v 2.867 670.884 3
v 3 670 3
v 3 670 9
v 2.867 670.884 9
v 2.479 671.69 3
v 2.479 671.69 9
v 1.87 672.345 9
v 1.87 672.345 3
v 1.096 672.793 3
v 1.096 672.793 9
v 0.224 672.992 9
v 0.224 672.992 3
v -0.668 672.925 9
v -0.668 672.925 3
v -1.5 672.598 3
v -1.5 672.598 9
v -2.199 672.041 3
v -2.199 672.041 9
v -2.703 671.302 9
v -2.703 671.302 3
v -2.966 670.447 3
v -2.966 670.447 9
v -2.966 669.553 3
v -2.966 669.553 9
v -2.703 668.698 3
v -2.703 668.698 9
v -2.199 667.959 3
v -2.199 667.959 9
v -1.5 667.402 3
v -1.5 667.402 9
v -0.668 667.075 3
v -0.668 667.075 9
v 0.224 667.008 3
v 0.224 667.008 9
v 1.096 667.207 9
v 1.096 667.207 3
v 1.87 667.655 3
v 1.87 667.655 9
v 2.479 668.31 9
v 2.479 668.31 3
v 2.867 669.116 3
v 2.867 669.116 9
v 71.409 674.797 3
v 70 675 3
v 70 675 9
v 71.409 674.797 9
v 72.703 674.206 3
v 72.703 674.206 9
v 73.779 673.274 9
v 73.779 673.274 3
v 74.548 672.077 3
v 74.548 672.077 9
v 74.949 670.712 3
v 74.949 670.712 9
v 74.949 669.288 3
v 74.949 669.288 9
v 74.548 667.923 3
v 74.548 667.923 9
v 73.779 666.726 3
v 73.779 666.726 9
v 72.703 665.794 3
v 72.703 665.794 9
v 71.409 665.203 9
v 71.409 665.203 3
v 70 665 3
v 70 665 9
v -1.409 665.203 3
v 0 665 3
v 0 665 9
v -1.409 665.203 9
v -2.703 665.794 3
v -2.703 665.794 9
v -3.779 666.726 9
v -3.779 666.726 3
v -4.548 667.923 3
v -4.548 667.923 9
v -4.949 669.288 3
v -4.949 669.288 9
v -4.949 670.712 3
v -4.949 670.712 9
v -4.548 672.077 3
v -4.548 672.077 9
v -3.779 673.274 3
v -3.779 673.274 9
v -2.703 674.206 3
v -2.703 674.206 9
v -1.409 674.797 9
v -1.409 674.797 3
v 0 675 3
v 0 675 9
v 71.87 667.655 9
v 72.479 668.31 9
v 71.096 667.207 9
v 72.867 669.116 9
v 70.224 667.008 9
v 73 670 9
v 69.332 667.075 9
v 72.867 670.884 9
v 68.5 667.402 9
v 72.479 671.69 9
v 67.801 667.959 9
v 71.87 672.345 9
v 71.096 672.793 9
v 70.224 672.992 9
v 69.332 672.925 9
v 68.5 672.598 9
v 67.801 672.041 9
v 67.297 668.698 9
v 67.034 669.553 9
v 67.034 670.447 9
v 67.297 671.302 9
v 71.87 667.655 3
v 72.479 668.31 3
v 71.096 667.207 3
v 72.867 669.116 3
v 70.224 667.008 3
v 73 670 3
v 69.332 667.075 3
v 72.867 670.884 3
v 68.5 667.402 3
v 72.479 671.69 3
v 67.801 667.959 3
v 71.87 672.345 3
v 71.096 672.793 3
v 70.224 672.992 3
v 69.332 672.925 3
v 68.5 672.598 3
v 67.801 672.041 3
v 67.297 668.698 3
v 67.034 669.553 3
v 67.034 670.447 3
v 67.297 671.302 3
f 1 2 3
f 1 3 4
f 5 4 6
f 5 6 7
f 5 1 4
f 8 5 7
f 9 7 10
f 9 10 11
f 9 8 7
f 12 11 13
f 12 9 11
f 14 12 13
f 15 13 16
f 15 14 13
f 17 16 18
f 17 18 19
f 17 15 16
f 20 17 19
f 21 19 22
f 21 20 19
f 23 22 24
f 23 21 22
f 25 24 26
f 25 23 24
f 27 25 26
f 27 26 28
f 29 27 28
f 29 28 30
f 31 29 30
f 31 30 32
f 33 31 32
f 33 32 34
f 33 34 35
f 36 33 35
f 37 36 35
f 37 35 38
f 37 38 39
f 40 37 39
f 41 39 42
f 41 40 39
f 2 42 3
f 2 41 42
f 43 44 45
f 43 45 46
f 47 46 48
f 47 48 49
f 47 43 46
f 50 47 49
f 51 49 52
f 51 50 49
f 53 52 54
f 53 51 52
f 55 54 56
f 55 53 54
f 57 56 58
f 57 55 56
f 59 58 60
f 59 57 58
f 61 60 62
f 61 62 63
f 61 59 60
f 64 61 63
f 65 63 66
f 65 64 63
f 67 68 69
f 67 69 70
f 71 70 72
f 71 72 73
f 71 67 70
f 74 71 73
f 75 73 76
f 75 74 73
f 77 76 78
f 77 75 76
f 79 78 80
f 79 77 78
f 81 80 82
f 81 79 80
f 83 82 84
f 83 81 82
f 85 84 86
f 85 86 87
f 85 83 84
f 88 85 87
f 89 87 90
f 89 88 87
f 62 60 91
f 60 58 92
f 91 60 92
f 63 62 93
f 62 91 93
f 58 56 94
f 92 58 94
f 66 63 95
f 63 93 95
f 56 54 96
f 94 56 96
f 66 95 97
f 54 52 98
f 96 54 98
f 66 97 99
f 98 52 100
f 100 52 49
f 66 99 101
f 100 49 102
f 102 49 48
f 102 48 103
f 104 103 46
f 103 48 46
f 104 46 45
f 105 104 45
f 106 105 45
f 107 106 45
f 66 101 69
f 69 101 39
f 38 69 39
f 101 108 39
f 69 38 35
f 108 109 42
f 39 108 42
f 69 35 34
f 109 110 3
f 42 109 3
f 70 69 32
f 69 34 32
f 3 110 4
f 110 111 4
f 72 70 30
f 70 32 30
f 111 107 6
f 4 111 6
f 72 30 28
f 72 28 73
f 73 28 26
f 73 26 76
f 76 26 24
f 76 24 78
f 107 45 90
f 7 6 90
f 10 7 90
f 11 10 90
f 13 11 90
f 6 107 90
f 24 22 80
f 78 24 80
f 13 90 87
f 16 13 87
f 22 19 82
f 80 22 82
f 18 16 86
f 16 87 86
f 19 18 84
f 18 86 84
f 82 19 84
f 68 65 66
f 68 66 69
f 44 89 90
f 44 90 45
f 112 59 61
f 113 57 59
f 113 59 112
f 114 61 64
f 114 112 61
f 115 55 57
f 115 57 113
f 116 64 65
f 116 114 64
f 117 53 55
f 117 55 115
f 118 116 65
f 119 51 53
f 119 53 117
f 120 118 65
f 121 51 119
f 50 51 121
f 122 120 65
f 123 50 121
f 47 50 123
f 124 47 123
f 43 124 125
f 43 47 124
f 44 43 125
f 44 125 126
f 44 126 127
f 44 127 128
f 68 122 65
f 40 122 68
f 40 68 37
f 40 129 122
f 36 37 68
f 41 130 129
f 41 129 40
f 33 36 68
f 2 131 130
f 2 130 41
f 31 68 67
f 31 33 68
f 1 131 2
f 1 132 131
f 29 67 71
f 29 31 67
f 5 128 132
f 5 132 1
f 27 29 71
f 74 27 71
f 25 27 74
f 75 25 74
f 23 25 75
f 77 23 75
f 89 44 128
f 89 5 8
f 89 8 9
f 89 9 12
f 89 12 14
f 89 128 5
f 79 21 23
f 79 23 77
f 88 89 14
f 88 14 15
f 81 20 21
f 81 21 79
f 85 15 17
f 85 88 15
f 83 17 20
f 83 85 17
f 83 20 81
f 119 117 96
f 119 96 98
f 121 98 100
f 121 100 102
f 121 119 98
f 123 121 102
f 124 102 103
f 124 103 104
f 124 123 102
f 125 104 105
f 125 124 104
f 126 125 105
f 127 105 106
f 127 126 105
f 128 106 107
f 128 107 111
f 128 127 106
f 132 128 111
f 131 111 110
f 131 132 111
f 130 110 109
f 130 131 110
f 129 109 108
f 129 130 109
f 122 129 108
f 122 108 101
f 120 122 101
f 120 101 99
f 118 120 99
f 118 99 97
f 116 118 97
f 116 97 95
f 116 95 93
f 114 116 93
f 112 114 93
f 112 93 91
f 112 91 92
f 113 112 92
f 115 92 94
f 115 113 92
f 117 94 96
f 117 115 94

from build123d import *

# Parameters (mm, degrees)
AUFSATZ_LINEAR_START            = 3
SKIZZE2_R                       = 3
AUFSATZ_LINEAR_AUSTRAGEN1_DEPTH = 6


with BuildPart() as part:
    # Skizze2 → Aufsatz-Linear austragen1 (new body)
    with BuildSketch(Plane.XY.offset(AUFSATZ_LINEAR_START)):
        with BuildLine():
            Line((0, 675), (70, 675))
            ThreePointArc((70, 675), (75, 670), (70, 665))
            Line((70, 665), (0, 665))
            ThreePointArc((0, 665), (-5, 670), (0, 675))
        make_face()
        with Locations((0, 670)):
            Circle(SKIZZE2_R, mode=Mode.SUBTRACT)
        with Locations((70, 670)):
            Circle(SKIZZE2_R, mode=Mode.SUBTRACT)
    extrude(amount=AUFSATZ_LINEAR_AUSTRAGEN1_DEPTH)


solid = part.part
